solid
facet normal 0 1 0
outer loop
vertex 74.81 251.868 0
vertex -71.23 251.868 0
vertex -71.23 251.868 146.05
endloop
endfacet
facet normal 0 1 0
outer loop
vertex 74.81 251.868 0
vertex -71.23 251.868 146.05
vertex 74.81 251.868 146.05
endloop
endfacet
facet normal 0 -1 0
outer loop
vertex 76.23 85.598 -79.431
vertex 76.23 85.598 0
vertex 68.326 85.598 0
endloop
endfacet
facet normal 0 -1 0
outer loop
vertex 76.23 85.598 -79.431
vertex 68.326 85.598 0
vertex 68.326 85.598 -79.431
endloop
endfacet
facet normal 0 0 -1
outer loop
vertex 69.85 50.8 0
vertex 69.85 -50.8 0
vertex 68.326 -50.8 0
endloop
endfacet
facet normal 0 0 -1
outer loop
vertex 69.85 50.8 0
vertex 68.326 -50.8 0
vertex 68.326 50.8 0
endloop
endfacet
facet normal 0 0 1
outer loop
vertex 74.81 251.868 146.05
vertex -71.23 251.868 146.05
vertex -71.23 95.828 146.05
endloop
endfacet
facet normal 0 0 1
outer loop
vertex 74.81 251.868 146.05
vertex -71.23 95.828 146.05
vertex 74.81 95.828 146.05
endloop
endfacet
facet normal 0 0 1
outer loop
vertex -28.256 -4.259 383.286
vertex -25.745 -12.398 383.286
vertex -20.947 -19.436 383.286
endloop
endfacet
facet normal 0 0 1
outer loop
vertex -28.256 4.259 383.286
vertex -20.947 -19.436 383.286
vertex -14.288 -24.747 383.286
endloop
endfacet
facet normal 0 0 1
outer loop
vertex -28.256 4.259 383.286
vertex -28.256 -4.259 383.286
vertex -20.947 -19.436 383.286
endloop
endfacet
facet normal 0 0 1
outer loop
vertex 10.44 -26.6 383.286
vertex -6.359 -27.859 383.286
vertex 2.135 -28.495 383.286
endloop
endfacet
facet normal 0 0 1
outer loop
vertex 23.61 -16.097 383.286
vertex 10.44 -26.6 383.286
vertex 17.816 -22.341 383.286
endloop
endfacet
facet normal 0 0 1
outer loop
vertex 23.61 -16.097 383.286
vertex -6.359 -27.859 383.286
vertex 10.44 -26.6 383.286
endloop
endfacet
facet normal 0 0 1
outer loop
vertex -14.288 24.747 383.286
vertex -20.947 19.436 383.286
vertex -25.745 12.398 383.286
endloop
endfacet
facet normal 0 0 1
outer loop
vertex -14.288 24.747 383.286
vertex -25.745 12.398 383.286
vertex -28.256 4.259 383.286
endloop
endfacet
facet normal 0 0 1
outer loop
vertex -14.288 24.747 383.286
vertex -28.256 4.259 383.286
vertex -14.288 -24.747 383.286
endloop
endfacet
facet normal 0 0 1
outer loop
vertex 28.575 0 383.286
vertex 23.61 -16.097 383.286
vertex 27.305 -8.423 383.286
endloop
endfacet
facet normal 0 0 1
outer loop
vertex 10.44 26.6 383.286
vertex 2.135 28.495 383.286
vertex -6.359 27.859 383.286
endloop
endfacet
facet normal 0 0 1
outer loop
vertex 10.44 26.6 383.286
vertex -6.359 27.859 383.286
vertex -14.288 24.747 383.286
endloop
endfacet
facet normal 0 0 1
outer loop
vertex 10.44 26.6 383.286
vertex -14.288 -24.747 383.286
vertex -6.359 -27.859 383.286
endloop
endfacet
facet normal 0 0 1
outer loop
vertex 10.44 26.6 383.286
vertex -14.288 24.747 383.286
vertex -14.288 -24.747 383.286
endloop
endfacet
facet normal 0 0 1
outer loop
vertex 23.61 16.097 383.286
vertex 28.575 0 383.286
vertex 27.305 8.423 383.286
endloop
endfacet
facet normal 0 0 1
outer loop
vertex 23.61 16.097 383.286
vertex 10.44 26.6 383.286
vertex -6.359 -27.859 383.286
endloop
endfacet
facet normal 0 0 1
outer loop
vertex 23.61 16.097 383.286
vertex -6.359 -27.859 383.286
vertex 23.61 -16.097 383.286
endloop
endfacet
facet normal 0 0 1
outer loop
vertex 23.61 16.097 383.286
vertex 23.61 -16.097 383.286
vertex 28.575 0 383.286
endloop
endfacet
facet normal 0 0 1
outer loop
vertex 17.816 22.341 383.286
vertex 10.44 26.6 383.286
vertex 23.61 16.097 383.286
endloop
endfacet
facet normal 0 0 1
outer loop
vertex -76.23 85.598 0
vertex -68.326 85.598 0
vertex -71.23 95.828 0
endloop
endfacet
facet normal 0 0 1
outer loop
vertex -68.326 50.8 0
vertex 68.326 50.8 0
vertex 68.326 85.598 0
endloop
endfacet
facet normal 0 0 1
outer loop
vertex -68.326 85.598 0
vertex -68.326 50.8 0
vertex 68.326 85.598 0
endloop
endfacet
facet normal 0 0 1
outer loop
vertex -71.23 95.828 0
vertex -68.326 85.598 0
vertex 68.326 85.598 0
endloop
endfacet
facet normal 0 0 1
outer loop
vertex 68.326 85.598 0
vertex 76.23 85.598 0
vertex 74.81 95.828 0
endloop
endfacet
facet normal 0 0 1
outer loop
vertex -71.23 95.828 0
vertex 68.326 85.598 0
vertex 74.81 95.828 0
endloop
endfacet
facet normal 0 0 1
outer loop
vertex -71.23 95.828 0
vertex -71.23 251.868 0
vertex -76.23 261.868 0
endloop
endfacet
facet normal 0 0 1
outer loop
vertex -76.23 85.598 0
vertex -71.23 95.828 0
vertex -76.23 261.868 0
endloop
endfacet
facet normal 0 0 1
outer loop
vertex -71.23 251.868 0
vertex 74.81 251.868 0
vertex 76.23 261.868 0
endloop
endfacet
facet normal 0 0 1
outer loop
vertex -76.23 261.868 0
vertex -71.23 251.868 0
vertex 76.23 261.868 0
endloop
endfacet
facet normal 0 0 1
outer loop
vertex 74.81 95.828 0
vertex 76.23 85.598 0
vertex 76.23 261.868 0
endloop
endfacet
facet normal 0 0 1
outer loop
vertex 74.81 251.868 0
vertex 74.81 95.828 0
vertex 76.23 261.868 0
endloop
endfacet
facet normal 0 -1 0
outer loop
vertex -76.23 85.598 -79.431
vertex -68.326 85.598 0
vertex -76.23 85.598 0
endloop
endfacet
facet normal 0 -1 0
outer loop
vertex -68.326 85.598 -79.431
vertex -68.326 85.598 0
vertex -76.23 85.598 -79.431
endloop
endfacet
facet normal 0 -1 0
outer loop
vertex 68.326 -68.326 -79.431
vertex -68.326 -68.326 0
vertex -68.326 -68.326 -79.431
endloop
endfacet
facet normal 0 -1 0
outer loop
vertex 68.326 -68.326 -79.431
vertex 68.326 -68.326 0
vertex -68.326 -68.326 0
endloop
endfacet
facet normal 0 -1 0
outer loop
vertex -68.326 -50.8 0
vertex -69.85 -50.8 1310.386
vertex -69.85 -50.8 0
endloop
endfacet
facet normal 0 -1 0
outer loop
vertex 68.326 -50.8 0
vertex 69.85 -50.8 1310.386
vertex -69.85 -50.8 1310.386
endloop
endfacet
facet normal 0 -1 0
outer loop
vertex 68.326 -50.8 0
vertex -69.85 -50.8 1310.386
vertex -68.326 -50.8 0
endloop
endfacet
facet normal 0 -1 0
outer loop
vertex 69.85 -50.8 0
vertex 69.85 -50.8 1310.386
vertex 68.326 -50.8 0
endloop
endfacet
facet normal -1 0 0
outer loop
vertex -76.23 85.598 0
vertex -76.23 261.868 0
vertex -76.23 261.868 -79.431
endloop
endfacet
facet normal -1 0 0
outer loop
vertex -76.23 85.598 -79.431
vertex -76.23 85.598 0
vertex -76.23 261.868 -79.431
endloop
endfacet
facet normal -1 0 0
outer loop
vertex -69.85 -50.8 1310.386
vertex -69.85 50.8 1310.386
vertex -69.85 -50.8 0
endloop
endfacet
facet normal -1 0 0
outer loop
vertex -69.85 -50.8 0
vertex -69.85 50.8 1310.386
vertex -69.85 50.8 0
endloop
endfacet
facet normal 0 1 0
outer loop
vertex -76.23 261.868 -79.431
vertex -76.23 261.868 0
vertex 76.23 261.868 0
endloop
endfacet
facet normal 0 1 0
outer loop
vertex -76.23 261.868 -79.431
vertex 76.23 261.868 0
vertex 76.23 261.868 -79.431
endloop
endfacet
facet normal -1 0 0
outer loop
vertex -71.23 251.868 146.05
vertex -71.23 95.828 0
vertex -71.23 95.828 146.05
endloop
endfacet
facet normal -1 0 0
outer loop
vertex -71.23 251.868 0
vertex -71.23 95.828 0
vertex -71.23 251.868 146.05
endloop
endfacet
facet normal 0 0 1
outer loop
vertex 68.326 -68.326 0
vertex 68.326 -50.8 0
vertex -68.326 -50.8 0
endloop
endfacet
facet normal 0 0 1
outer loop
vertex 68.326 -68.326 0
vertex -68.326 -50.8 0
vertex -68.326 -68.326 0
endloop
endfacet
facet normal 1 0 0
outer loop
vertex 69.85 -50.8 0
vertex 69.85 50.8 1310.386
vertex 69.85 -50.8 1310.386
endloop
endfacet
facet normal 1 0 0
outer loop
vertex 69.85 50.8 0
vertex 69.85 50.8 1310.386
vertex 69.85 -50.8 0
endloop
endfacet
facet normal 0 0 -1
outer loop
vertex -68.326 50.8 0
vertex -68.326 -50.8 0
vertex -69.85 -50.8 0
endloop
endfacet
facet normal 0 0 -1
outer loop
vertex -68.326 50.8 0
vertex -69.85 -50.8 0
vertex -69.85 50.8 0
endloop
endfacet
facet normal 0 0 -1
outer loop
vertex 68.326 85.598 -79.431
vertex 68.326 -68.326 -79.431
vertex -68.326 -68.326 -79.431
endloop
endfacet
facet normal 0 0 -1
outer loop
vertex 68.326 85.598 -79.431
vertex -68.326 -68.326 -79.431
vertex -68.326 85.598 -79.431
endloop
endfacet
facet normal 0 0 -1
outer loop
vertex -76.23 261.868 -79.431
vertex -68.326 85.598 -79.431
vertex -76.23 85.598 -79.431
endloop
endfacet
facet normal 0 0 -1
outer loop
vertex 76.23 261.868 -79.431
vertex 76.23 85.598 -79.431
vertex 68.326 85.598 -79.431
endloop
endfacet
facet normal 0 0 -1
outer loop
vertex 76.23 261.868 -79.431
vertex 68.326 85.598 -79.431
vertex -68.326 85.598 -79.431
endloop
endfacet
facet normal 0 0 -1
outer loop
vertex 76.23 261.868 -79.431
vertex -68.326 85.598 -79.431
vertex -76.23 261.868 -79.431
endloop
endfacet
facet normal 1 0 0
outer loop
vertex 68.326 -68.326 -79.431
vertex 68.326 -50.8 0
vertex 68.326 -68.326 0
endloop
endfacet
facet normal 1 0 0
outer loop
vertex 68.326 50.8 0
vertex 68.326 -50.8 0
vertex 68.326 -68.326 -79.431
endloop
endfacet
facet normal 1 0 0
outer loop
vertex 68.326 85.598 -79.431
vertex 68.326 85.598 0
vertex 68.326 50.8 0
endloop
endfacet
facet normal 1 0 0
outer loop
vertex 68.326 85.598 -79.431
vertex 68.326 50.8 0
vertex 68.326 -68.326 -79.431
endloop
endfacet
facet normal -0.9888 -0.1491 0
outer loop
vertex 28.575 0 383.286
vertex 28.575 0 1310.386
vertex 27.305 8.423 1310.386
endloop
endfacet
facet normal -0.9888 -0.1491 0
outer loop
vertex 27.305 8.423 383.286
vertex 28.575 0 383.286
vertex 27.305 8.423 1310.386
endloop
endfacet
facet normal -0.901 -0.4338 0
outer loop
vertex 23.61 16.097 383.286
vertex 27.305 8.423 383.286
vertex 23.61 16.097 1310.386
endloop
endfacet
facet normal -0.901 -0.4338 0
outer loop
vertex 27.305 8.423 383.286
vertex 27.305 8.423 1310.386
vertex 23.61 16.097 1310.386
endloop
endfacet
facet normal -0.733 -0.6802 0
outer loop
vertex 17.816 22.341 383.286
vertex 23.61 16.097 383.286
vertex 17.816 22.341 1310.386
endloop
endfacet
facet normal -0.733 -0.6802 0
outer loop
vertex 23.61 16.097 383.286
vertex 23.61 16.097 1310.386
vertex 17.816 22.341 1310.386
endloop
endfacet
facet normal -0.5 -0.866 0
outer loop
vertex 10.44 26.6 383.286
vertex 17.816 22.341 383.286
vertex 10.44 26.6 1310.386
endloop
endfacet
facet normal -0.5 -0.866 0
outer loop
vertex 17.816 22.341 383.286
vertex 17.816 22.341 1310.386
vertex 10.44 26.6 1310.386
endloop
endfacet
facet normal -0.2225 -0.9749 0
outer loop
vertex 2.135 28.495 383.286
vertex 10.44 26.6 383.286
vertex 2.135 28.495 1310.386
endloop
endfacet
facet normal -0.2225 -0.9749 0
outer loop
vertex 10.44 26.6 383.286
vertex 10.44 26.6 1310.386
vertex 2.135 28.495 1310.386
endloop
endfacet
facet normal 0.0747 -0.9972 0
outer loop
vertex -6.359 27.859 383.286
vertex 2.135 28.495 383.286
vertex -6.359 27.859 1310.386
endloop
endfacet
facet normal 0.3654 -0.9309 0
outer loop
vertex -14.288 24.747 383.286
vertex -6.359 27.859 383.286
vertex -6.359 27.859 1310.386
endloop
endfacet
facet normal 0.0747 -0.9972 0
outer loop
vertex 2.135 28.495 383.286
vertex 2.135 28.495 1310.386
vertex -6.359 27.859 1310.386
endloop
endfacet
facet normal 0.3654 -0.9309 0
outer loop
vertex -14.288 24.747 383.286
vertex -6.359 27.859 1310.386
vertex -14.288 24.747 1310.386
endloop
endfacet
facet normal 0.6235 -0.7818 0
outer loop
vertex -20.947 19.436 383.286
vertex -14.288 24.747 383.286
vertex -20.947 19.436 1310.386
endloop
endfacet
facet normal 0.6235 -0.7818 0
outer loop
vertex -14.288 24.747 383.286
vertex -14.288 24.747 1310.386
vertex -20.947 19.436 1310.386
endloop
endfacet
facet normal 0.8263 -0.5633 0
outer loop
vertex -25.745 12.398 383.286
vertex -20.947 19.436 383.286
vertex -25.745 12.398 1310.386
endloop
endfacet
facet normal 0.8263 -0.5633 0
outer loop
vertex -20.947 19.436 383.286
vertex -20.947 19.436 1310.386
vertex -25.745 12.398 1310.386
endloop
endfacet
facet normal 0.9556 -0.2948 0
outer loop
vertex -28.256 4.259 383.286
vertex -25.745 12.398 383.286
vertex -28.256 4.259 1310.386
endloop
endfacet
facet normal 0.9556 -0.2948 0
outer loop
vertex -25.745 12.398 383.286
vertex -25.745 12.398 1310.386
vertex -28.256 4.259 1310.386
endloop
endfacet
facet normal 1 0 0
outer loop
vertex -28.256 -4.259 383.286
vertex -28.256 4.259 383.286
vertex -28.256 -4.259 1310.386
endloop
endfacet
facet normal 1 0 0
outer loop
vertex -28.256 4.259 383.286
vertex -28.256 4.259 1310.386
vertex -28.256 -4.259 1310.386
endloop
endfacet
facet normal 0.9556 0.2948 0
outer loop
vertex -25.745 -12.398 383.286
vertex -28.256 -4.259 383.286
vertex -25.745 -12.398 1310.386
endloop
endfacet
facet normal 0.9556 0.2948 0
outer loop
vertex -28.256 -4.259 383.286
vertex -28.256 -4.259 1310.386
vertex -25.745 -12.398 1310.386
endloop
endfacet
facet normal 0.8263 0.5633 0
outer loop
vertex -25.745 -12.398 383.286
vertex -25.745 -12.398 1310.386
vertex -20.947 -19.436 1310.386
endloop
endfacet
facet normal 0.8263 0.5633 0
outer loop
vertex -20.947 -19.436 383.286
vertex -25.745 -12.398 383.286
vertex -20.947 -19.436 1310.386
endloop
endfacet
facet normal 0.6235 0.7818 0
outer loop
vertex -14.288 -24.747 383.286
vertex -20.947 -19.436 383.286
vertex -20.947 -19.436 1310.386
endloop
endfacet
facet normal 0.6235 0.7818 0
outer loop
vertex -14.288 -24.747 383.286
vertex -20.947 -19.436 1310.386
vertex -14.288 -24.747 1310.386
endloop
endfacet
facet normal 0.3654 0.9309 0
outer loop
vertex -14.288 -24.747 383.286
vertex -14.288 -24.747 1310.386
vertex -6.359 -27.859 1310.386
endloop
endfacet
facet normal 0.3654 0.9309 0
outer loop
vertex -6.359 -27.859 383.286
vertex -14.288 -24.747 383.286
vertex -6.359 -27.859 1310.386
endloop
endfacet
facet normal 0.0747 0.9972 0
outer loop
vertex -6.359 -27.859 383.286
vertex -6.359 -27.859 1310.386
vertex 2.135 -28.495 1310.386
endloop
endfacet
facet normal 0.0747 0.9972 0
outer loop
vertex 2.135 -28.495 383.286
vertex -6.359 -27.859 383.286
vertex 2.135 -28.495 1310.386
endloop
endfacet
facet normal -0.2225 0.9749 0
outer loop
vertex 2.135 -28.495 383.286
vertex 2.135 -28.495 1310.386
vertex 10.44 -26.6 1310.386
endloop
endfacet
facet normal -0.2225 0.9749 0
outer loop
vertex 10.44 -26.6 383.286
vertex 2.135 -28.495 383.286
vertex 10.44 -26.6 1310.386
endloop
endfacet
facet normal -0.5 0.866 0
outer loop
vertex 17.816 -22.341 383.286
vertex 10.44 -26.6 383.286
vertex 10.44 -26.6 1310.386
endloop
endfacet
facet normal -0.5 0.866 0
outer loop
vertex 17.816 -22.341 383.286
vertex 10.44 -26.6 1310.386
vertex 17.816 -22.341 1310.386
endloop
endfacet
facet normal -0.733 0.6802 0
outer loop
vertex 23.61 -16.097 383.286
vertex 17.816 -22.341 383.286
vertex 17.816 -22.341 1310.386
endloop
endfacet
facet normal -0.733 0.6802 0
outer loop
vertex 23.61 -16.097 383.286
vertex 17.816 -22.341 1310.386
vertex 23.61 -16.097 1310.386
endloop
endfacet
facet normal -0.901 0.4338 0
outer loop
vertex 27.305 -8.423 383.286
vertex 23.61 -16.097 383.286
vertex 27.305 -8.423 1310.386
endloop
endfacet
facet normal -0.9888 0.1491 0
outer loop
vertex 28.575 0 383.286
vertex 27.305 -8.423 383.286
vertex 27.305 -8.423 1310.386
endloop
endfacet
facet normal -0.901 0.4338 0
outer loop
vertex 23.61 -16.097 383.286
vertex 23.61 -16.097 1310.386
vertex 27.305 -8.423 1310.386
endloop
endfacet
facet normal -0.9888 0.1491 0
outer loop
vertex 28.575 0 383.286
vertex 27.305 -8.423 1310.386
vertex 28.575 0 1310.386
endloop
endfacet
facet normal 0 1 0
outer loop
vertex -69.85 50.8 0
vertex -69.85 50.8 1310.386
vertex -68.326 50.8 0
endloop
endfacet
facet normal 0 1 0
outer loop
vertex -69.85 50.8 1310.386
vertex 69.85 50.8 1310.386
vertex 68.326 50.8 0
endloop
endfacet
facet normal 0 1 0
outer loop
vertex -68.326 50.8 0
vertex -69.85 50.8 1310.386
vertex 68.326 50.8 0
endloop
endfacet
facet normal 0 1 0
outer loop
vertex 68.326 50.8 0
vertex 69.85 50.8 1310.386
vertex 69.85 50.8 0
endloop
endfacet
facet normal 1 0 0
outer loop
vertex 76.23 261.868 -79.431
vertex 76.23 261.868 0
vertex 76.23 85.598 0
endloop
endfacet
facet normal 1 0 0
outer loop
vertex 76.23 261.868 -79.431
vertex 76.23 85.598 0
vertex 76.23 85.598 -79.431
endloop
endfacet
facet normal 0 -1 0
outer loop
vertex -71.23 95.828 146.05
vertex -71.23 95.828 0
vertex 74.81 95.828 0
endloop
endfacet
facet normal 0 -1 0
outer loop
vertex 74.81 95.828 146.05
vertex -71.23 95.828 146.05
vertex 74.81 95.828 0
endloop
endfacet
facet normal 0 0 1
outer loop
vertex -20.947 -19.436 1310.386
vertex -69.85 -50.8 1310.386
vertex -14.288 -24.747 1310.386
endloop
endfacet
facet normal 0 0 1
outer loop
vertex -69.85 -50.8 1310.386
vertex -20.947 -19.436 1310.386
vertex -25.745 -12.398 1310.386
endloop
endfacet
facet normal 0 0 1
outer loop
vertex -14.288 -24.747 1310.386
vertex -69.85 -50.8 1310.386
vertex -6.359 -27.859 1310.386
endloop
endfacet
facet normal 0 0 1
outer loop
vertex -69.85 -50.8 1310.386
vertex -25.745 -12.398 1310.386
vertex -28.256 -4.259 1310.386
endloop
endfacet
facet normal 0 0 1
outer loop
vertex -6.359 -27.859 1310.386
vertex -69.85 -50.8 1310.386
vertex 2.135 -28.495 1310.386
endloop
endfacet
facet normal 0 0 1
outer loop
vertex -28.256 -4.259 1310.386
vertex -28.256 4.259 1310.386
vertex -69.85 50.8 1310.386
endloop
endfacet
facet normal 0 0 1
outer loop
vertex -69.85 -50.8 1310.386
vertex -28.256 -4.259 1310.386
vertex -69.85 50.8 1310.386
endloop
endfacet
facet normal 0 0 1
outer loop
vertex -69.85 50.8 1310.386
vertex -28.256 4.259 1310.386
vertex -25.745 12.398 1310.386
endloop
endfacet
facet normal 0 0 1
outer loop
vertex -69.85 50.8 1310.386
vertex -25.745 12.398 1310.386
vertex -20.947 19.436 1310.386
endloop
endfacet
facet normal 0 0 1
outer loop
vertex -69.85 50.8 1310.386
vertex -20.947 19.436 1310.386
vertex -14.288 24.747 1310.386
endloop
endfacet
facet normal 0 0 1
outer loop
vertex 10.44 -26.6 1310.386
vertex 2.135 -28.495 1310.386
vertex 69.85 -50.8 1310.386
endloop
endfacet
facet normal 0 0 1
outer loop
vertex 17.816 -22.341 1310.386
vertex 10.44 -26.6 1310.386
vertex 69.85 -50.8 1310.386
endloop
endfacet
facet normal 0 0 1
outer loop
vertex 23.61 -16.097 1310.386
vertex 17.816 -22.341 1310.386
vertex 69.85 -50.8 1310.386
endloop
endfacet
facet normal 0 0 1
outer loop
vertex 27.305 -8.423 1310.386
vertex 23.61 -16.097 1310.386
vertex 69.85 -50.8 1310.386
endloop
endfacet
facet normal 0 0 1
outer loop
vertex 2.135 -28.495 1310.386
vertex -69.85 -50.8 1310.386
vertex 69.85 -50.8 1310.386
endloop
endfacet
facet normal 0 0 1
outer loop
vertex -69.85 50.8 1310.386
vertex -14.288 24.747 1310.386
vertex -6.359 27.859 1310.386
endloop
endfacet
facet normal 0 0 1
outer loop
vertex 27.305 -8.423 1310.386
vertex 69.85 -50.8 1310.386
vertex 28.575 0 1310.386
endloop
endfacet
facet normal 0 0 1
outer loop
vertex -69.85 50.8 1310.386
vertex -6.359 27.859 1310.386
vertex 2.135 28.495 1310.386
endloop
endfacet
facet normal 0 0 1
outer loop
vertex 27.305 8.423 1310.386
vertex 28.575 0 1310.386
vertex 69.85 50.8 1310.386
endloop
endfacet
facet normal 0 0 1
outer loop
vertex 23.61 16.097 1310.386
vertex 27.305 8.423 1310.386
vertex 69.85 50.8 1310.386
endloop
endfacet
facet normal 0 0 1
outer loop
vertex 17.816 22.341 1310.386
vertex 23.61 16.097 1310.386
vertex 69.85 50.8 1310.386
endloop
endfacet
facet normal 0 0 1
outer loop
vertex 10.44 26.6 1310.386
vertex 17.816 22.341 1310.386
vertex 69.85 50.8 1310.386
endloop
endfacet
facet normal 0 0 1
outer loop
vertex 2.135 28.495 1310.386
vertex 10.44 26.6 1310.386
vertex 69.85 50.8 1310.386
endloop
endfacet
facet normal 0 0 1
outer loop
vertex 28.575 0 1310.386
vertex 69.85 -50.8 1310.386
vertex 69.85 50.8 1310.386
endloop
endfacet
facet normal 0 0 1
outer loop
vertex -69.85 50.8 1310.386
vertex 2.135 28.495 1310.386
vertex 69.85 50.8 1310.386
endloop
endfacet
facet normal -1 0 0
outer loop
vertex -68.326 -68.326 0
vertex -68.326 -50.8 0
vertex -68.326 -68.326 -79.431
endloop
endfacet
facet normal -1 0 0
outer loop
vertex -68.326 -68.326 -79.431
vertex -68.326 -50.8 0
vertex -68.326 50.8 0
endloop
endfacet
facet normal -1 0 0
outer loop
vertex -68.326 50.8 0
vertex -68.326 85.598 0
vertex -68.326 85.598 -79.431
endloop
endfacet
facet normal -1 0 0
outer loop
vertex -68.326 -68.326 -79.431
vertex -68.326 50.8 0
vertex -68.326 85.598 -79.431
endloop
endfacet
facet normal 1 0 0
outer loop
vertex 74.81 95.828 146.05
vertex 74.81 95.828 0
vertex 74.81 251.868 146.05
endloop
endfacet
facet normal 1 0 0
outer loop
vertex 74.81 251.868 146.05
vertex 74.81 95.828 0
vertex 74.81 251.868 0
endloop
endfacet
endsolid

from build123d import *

# Parameters (mm, degrees)
SKETCH1_W           = 1310.386
SKETCH1_H           = 101.6
BOSS_EXTRUDE1_DEPTH = 69.85
BOSS_EXTRUDE2_DEPTH = 68.326
SKETCH3_W           = 79.430838384
SKETCH3_H           = 176.27
BOSS_EXTRUDE3_DEPTH = 76.23
SKETCH4_W           = 146.04
SKETCH4_H           = 156.04
BOSS_EXTRUDE4_DEPTH = 146.05
SKETCH5_R           = 28.575
CUT_EXTRUDE1_DEPTH  = 927.1


with BuildPart() as part:
    # Sketch1 → Boss-Extrude1 (new, symmetric)
    with BuildSketch(Plane(origin=(0, 0, 0), x_dir=(0, 0, -1), z_dir=(1, 0, 0))):
        with Locations((-655.193, 0)):
            Rectangle(SKETCH1_W, SKETCH1_H)
    extrude(amount=BOSS_EXTRUDE1_DEPTH, both=True)

    # Sketch2 → Boss-Extrude2 (add, symmetric)
    with BuildSketch(Plane(origin=(0, 0, 0), x_dir=(0, 0, -1), z_dir=(1, 0, 0))):
        Polygon((0, 0), (0, -68.326), (79.430838384, -68.326), (79.430838384, 85.598), (0, 85.598), align=None)
    extrude(amount=BOSS_EXTRUDE2_DEPTH, both=True)

    # Sketch3 → Boss-Extrude3 (add, symmetric)
    with BuildSketch(Plane(origin=(0, 0, 0), x_dir=(0, 0, -1), z_dir=(1, 0, 0))):
        with Locations((39.715419192, 173.733)):
            Rectangle(SKETCH3_W, SKETCH3_H)
    extrude(amount=BOSS_EXTRUDE3_DEPTH, both=True)

    # Sketch4 → Boss-Extrude4 (add)
    with BuildSketch(Plane.XY):
        with Locations((1.79, 173.848)):
            Rectangle(SKETCH4_W, SKETCH4_H)
    extrude(amount=BOSS_EXTRUDE4_DEPTH)

    # Sketch5 → Cut-Extrude1 (cut)
    with BuildSketch(Plane.XY.offset(1310.386)):
        Circle(SKETCH5_R)
    extrude(amount=-CUT_EXTRUDE1_DEPTH, mode=Mode.SUBTRACT)


solid = part.part
